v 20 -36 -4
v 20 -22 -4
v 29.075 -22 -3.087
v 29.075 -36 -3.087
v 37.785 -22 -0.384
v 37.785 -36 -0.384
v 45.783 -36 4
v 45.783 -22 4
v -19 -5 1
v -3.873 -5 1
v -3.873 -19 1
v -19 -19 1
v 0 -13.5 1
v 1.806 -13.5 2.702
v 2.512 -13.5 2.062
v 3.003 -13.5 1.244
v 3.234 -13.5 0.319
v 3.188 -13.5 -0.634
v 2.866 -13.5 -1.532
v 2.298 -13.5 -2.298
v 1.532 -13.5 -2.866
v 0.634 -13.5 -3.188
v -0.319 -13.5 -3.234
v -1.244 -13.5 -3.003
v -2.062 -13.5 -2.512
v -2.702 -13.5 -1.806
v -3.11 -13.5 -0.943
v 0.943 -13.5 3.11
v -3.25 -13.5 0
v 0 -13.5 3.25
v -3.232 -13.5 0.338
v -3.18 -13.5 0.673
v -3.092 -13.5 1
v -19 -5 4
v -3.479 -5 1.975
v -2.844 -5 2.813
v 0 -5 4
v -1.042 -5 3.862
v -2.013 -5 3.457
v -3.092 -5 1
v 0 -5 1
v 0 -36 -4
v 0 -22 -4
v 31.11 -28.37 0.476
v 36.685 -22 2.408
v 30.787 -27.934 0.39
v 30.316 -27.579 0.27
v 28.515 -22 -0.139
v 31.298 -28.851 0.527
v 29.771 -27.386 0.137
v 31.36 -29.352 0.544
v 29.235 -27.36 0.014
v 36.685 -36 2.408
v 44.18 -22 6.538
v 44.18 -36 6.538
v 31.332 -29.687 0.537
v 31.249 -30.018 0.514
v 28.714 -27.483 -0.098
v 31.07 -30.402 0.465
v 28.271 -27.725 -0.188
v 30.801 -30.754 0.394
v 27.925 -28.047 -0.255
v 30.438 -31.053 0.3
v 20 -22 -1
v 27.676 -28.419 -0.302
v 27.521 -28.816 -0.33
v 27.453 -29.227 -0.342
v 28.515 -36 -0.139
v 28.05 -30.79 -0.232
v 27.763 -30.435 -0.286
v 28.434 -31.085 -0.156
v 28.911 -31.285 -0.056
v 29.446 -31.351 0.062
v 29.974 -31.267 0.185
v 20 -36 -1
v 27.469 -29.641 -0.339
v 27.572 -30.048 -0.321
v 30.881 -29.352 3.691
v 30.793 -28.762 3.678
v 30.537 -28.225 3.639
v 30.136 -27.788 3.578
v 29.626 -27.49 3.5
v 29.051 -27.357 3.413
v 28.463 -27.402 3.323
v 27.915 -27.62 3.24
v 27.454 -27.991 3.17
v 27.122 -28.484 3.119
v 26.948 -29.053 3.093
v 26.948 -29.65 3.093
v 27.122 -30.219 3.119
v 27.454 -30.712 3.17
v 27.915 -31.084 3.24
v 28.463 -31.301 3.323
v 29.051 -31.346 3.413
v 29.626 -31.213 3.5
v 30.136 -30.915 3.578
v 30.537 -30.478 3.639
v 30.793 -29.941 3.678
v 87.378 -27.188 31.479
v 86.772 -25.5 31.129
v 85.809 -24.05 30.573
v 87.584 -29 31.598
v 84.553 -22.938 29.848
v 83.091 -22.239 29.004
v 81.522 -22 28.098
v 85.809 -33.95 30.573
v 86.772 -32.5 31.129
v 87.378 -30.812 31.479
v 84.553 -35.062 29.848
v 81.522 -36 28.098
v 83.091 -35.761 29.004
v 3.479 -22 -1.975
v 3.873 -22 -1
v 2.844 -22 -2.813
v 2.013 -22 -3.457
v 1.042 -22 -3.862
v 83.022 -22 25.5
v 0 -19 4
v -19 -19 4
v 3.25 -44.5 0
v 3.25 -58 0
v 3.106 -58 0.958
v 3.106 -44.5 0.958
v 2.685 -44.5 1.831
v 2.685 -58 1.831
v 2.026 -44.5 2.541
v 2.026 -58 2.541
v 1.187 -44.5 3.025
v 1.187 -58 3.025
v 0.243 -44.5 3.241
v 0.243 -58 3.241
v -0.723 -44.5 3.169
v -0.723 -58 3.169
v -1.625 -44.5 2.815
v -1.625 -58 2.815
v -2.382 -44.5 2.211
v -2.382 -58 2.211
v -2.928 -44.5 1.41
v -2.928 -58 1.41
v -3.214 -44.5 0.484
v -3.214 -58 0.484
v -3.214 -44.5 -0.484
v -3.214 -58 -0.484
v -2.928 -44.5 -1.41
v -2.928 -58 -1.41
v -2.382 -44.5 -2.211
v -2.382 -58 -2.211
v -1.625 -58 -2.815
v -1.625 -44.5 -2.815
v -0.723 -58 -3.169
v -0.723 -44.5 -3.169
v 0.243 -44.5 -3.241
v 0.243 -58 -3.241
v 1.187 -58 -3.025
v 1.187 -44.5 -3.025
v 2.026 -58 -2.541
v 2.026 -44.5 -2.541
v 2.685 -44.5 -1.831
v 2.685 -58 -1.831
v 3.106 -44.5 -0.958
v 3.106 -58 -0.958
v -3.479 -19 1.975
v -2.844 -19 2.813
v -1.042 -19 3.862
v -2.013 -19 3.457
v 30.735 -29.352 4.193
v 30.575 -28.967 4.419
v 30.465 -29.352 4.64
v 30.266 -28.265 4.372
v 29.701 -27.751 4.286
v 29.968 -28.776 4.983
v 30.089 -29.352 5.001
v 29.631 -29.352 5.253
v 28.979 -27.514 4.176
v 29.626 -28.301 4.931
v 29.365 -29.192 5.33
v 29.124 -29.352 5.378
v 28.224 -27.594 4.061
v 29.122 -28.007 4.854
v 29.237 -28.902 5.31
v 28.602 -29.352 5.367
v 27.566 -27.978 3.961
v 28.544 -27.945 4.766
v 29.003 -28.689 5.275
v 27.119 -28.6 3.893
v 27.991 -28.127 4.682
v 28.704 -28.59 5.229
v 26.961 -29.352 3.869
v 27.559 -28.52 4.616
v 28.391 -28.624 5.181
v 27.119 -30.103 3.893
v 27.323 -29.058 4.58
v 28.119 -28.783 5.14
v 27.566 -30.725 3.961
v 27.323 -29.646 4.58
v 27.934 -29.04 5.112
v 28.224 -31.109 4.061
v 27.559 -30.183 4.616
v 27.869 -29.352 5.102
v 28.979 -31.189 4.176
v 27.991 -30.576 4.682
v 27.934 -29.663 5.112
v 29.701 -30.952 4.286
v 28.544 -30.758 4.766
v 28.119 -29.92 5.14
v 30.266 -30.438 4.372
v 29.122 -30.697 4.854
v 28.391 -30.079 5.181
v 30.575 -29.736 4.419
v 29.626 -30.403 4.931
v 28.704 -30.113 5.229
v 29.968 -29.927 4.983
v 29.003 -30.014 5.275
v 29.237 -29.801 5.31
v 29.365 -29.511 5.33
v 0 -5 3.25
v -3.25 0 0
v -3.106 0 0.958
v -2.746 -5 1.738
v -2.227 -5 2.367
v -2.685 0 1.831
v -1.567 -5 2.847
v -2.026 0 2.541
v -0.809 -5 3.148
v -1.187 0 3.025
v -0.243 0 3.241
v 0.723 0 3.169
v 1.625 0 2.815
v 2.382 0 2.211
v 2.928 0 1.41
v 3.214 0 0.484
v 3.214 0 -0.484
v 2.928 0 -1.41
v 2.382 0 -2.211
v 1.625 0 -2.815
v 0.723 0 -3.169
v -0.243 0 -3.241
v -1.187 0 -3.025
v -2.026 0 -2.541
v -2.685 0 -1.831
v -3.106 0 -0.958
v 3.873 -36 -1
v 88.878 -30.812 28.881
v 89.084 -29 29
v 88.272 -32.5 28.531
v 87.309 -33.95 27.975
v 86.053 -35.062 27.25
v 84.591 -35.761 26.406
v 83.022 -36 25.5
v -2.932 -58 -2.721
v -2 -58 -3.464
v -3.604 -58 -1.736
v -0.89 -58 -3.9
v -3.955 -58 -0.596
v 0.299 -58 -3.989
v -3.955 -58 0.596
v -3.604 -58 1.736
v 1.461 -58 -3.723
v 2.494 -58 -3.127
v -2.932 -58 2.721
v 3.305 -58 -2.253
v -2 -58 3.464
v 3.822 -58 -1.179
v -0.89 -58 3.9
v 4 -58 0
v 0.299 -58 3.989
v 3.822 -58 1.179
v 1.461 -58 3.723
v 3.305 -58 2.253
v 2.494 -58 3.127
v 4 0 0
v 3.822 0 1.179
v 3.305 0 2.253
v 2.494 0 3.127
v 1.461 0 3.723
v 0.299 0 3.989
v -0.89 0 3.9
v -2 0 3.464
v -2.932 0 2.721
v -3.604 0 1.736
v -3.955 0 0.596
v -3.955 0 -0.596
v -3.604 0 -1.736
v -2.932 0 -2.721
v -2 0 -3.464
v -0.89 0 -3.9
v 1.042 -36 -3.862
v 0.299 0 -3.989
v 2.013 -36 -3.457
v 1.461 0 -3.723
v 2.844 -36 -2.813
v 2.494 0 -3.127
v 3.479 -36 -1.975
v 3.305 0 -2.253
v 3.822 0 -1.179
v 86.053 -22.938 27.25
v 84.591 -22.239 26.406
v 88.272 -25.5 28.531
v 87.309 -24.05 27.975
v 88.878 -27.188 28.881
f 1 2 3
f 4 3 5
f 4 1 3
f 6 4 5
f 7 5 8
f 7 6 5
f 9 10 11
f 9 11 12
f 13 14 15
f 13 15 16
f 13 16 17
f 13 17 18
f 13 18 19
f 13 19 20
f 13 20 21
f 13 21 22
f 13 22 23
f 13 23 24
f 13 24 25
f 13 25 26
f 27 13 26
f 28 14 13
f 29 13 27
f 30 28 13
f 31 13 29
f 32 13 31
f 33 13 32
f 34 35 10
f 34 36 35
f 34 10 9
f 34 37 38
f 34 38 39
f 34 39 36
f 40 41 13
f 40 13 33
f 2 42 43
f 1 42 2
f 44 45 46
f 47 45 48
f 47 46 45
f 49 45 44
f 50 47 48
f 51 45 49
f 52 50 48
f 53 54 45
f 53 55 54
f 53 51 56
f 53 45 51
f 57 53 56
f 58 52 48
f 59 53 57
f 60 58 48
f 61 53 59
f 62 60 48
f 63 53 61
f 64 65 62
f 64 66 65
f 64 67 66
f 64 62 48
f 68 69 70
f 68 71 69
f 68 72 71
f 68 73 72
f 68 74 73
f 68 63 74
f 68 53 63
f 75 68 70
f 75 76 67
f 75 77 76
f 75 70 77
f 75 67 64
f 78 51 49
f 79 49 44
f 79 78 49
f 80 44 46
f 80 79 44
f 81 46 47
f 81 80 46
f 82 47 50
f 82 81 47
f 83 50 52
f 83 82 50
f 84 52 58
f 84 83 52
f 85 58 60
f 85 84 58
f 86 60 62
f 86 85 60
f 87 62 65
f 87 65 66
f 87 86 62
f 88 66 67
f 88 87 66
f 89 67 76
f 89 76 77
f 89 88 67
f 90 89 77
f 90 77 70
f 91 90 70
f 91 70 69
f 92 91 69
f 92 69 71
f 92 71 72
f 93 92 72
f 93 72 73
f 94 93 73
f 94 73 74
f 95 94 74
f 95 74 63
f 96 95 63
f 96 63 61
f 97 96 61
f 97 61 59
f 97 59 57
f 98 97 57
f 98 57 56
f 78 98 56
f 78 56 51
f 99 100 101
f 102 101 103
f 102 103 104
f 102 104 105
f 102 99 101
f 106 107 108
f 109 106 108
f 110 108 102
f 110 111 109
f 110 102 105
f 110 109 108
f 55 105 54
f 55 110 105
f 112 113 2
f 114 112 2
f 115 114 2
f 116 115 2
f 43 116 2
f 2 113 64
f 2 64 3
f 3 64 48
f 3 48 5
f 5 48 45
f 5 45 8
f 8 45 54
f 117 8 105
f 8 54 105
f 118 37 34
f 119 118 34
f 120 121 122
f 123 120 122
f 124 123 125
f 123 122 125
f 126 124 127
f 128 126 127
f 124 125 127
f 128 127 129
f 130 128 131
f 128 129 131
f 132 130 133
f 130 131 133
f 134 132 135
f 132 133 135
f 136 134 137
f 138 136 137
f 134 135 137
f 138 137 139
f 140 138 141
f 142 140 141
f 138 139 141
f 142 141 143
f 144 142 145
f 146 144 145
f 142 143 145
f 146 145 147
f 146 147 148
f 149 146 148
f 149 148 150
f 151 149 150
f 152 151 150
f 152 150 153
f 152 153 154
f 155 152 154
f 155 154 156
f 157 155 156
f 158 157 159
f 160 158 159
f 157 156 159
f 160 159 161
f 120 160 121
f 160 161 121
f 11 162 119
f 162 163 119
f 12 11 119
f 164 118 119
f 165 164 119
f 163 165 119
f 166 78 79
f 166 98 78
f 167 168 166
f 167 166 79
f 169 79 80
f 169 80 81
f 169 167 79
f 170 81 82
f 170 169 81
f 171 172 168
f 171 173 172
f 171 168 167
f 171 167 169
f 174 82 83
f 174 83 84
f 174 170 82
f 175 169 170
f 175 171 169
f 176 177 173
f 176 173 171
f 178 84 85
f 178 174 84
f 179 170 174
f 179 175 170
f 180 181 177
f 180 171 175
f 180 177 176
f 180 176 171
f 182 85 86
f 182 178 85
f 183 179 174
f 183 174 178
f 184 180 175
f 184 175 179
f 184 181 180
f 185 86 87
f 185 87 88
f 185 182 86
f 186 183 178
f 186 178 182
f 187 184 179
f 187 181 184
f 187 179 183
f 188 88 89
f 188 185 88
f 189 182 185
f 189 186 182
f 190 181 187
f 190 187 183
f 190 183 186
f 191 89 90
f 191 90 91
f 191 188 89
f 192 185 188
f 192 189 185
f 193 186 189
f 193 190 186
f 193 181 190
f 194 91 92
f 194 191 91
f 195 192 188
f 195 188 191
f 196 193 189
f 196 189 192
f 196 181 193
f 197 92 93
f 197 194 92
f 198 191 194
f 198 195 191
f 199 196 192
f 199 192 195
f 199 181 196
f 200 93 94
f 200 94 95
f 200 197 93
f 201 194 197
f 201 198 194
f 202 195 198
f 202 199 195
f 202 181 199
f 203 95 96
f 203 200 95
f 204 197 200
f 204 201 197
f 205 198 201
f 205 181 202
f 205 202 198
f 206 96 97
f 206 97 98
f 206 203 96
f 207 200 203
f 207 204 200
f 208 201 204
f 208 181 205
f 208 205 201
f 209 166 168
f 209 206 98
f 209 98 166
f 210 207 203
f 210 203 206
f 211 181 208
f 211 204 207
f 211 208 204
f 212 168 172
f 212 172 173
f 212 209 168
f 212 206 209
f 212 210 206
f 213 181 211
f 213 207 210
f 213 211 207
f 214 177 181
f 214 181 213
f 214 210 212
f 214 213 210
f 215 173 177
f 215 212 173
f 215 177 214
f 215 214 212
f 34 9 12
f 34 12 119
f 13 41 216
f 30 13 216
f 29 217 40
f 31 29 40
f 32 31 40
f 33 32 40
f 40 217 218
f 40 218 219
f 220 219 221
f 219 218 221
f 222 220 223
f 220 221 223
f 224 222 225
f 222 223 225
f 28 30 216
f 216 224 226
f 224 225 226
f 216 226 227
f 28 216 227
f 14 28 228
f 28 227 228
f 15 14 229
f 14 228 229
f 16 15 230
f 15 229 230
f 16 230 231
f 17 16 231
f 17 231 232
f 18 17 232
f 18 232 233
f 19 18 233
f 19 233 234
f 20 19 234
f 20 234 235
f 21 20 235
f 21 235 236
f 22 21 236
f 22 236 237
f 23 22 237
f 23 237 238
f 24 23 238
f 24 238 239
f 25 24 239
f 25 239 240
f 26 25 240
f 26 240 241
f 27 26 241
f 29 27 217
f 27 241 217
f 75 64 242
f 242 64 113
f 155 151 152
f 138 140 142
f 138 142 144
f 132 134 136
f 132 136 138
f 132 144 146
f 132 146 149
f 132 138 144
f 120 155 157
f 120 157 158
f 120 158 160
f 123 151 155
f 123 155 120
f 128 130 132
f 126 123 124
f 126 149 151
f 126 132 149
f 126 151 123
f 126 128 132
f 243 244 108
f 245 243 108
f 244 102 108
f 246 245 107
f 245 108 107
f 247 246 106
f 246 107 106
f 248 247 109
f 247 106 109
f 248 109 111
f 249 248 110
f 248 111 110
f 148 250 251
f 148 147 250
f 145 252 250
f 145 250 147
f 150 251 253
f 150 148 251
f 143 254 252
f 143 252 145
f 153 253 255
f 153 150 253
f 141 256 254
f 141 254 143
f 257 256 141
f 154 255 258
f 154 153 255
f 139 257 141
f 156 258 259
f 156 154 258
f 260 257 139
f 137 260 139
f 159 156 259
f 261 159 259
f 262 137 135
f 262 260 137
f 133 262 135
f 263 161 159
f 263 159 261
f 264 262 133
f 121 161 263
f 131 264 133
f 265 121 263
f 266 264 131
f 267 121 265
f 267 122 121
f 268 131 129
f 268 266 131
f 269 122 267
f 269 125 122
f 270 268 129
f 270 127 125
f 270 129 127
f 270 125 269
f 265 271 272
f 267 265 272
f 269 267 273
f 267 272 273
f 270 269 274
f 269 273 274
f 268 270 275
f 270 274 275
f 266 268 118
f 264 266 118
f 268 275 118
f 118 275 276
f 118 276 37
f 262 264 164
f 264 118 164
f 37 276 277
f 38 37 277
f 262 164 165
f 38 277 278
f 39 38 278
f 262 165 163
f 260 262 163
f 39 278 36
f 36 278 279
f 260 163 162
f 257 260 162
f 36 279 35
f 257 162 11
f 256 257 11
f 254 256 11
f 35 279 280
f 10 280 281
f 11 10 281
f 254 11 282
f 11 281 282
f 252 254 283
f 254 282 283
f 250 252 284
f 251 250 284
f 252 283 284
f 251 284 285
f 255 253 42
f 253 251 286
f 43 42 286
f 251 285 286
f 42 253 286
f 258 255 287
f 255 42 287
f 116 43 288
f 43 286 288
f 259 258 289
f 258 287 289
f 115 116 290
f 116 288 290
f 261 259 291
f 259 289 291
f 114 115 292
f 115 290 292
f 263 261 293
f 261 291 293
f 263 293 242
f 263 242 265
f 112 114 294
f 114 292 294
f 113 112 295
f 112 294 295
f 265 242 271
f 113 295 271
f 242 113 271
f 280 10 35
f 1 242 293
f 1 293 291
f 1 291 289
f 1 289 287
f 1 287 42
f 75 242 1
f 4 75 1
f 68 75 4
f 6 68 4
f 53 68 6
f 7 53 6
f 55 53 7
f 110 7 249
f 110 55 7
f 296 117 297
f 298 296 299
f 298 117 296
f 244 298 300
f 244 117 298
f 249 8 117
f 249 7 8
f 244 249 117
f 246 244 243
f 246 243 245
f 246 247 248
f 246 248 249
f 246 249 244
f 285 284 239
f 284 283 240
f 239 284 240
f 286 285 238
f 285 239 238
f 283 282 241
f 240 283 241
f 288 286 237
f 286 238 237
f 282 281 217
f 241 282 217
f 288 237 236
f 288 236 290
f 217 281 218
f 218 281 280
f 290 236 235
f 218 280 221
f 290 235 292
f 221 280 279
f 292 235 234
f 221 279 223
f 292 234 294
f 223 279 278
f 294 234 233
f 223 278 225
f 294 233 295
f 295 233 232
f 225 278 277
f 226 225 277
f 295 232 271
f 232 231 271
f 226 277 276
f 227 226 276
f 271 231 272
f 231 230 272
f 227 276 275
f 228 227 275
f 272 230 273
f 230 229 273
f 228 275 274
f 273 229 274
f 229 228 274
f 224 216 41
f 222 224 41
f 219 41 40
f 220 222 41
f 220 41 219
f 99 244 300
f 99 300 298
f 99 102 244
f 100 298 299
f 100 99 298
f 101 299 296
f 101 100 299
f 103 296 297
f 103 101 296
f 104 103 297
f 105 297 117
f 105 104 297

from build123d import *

# Parameters (mm, degrees)
F0_R           = 4
F1_DEPTH       = 58
F2_R           = 3.25
F3_DEPTH       = 13.5
F4_R           = 3.25
F5_DEPTH       = 13.5
F8_DEPTH       = 7
F8_DEPTH_BACK  = 7
F9_R           = 6.99999
F11_W          = 19
F11_H          = 3
F12_DEPTH      = 14
F17_R          = 2
F18_DEPTH      = 5
F18_DEPTH_BACK = 0.471687069
F19_R          = 2


# Not quite as in the source:
# - a fillet or chamfer is up to 0.001 mm smaller than in the source, because OpenCascade refuses the exact size


with BuildPart() as f1:
    # F0 (on Front) → F1 (new body)
    with BuildSketch(Plane.XZ):
        Circle(F0_R)
    extrude(amount=F1_DEPTH)

    # F2 (on face) → F3 (cut)
    with BuildSketch(Plane.XZ.offset(58)):
        Circle(F2_R)
    extrude(amount=-F3_DEPTH, mode=Mode.SUBTRACT)

    # F4 (on face) → F5 (cut)
    with BuildSketch(Plane(origin=(0, 0, 0), x_dir=(-1, 0, 0), z_dir=(0, 1, 0))):
        Circle(F4_R)
    extrude(amount=-F5_DEPTH, mode=Mode.SUBTRACT)

    # F7 (on offset) → F8 (join, two sides)
    with BuildSketch(Plane.XZ.offset(29)) as f8_sk:
        with BuildLine():
            Line((0, -1), (0, -4))
            Line((0, -4), (20, -4))
            ThreePointArc((20, -4), (33.4977869164, -1.9540489613), (45.7829596161, 4))
            Line((45.7829596161, 4), (89.0842298053, 29))
            Line((89.0842298053, 29), (87.5842298053, 31.5980762114))
            Line((87.5842298053, 31.5980762114), (44.1796846254, 6.5384503677))
            ThreePointArc((44.1796846254, 6.5384503677), (32.6637808585, 0.9283092986), (20, -1))
            Line((20, -1), (0, -1))
        make_face()
    extrude(amount=F8_DEPTH)
    extrude(f8_sk.sketch, amount=-F8_DEPTH_BACK)

    # F9 (radius 7 in the source; OpenCascade refuses exactly that, so slightly less here)
    f9_edges = [f1.edges().sort_by_distance(p)[0] for p in [
        (88.33423, -36, 30.299038),
        (88.33423, -22, 30.299038),
    ]]
    fillet(f9_edges, radius=F9_R)

    # F11 (on offset) → F12 (join)
    with BuildSketch(Plane(origin=(0, -5, 0), x_dir=(-1, 0, 0), z_dir=(0, 1, 0))):
        with Locations((9.5, 2.5)):
            Rectangle(F11_W, F11_H)
    extrude(amount=-F12_DEPTH)

    # F17 (on 3pt) → F18 (join, two sides)
    with BuildSketch(Plane(origin=(0.602031742, 0, -3.953721561), x_dir=(0.9886047584, 0, 0.1505344865), z_dir=(-0.1505344865, 0, 0.9886047584))) as f18_sk:
        with Locations((29.0842950344, -29.3515790254)):
            Circle(F17_R)
    extrude(amount=F18_DEPTH)
    extrude(f18_sk.sketch, amount=-F18_DEPTH_BACK)

    # F19
    f19_edges = [f1.edges().sort_by_distance(p)[0] for p in [
        (26.625022, -29.351579, 5.066423),
    ]]
    fillet(f19_edges, radius=F19_R)


solid = f1.part
